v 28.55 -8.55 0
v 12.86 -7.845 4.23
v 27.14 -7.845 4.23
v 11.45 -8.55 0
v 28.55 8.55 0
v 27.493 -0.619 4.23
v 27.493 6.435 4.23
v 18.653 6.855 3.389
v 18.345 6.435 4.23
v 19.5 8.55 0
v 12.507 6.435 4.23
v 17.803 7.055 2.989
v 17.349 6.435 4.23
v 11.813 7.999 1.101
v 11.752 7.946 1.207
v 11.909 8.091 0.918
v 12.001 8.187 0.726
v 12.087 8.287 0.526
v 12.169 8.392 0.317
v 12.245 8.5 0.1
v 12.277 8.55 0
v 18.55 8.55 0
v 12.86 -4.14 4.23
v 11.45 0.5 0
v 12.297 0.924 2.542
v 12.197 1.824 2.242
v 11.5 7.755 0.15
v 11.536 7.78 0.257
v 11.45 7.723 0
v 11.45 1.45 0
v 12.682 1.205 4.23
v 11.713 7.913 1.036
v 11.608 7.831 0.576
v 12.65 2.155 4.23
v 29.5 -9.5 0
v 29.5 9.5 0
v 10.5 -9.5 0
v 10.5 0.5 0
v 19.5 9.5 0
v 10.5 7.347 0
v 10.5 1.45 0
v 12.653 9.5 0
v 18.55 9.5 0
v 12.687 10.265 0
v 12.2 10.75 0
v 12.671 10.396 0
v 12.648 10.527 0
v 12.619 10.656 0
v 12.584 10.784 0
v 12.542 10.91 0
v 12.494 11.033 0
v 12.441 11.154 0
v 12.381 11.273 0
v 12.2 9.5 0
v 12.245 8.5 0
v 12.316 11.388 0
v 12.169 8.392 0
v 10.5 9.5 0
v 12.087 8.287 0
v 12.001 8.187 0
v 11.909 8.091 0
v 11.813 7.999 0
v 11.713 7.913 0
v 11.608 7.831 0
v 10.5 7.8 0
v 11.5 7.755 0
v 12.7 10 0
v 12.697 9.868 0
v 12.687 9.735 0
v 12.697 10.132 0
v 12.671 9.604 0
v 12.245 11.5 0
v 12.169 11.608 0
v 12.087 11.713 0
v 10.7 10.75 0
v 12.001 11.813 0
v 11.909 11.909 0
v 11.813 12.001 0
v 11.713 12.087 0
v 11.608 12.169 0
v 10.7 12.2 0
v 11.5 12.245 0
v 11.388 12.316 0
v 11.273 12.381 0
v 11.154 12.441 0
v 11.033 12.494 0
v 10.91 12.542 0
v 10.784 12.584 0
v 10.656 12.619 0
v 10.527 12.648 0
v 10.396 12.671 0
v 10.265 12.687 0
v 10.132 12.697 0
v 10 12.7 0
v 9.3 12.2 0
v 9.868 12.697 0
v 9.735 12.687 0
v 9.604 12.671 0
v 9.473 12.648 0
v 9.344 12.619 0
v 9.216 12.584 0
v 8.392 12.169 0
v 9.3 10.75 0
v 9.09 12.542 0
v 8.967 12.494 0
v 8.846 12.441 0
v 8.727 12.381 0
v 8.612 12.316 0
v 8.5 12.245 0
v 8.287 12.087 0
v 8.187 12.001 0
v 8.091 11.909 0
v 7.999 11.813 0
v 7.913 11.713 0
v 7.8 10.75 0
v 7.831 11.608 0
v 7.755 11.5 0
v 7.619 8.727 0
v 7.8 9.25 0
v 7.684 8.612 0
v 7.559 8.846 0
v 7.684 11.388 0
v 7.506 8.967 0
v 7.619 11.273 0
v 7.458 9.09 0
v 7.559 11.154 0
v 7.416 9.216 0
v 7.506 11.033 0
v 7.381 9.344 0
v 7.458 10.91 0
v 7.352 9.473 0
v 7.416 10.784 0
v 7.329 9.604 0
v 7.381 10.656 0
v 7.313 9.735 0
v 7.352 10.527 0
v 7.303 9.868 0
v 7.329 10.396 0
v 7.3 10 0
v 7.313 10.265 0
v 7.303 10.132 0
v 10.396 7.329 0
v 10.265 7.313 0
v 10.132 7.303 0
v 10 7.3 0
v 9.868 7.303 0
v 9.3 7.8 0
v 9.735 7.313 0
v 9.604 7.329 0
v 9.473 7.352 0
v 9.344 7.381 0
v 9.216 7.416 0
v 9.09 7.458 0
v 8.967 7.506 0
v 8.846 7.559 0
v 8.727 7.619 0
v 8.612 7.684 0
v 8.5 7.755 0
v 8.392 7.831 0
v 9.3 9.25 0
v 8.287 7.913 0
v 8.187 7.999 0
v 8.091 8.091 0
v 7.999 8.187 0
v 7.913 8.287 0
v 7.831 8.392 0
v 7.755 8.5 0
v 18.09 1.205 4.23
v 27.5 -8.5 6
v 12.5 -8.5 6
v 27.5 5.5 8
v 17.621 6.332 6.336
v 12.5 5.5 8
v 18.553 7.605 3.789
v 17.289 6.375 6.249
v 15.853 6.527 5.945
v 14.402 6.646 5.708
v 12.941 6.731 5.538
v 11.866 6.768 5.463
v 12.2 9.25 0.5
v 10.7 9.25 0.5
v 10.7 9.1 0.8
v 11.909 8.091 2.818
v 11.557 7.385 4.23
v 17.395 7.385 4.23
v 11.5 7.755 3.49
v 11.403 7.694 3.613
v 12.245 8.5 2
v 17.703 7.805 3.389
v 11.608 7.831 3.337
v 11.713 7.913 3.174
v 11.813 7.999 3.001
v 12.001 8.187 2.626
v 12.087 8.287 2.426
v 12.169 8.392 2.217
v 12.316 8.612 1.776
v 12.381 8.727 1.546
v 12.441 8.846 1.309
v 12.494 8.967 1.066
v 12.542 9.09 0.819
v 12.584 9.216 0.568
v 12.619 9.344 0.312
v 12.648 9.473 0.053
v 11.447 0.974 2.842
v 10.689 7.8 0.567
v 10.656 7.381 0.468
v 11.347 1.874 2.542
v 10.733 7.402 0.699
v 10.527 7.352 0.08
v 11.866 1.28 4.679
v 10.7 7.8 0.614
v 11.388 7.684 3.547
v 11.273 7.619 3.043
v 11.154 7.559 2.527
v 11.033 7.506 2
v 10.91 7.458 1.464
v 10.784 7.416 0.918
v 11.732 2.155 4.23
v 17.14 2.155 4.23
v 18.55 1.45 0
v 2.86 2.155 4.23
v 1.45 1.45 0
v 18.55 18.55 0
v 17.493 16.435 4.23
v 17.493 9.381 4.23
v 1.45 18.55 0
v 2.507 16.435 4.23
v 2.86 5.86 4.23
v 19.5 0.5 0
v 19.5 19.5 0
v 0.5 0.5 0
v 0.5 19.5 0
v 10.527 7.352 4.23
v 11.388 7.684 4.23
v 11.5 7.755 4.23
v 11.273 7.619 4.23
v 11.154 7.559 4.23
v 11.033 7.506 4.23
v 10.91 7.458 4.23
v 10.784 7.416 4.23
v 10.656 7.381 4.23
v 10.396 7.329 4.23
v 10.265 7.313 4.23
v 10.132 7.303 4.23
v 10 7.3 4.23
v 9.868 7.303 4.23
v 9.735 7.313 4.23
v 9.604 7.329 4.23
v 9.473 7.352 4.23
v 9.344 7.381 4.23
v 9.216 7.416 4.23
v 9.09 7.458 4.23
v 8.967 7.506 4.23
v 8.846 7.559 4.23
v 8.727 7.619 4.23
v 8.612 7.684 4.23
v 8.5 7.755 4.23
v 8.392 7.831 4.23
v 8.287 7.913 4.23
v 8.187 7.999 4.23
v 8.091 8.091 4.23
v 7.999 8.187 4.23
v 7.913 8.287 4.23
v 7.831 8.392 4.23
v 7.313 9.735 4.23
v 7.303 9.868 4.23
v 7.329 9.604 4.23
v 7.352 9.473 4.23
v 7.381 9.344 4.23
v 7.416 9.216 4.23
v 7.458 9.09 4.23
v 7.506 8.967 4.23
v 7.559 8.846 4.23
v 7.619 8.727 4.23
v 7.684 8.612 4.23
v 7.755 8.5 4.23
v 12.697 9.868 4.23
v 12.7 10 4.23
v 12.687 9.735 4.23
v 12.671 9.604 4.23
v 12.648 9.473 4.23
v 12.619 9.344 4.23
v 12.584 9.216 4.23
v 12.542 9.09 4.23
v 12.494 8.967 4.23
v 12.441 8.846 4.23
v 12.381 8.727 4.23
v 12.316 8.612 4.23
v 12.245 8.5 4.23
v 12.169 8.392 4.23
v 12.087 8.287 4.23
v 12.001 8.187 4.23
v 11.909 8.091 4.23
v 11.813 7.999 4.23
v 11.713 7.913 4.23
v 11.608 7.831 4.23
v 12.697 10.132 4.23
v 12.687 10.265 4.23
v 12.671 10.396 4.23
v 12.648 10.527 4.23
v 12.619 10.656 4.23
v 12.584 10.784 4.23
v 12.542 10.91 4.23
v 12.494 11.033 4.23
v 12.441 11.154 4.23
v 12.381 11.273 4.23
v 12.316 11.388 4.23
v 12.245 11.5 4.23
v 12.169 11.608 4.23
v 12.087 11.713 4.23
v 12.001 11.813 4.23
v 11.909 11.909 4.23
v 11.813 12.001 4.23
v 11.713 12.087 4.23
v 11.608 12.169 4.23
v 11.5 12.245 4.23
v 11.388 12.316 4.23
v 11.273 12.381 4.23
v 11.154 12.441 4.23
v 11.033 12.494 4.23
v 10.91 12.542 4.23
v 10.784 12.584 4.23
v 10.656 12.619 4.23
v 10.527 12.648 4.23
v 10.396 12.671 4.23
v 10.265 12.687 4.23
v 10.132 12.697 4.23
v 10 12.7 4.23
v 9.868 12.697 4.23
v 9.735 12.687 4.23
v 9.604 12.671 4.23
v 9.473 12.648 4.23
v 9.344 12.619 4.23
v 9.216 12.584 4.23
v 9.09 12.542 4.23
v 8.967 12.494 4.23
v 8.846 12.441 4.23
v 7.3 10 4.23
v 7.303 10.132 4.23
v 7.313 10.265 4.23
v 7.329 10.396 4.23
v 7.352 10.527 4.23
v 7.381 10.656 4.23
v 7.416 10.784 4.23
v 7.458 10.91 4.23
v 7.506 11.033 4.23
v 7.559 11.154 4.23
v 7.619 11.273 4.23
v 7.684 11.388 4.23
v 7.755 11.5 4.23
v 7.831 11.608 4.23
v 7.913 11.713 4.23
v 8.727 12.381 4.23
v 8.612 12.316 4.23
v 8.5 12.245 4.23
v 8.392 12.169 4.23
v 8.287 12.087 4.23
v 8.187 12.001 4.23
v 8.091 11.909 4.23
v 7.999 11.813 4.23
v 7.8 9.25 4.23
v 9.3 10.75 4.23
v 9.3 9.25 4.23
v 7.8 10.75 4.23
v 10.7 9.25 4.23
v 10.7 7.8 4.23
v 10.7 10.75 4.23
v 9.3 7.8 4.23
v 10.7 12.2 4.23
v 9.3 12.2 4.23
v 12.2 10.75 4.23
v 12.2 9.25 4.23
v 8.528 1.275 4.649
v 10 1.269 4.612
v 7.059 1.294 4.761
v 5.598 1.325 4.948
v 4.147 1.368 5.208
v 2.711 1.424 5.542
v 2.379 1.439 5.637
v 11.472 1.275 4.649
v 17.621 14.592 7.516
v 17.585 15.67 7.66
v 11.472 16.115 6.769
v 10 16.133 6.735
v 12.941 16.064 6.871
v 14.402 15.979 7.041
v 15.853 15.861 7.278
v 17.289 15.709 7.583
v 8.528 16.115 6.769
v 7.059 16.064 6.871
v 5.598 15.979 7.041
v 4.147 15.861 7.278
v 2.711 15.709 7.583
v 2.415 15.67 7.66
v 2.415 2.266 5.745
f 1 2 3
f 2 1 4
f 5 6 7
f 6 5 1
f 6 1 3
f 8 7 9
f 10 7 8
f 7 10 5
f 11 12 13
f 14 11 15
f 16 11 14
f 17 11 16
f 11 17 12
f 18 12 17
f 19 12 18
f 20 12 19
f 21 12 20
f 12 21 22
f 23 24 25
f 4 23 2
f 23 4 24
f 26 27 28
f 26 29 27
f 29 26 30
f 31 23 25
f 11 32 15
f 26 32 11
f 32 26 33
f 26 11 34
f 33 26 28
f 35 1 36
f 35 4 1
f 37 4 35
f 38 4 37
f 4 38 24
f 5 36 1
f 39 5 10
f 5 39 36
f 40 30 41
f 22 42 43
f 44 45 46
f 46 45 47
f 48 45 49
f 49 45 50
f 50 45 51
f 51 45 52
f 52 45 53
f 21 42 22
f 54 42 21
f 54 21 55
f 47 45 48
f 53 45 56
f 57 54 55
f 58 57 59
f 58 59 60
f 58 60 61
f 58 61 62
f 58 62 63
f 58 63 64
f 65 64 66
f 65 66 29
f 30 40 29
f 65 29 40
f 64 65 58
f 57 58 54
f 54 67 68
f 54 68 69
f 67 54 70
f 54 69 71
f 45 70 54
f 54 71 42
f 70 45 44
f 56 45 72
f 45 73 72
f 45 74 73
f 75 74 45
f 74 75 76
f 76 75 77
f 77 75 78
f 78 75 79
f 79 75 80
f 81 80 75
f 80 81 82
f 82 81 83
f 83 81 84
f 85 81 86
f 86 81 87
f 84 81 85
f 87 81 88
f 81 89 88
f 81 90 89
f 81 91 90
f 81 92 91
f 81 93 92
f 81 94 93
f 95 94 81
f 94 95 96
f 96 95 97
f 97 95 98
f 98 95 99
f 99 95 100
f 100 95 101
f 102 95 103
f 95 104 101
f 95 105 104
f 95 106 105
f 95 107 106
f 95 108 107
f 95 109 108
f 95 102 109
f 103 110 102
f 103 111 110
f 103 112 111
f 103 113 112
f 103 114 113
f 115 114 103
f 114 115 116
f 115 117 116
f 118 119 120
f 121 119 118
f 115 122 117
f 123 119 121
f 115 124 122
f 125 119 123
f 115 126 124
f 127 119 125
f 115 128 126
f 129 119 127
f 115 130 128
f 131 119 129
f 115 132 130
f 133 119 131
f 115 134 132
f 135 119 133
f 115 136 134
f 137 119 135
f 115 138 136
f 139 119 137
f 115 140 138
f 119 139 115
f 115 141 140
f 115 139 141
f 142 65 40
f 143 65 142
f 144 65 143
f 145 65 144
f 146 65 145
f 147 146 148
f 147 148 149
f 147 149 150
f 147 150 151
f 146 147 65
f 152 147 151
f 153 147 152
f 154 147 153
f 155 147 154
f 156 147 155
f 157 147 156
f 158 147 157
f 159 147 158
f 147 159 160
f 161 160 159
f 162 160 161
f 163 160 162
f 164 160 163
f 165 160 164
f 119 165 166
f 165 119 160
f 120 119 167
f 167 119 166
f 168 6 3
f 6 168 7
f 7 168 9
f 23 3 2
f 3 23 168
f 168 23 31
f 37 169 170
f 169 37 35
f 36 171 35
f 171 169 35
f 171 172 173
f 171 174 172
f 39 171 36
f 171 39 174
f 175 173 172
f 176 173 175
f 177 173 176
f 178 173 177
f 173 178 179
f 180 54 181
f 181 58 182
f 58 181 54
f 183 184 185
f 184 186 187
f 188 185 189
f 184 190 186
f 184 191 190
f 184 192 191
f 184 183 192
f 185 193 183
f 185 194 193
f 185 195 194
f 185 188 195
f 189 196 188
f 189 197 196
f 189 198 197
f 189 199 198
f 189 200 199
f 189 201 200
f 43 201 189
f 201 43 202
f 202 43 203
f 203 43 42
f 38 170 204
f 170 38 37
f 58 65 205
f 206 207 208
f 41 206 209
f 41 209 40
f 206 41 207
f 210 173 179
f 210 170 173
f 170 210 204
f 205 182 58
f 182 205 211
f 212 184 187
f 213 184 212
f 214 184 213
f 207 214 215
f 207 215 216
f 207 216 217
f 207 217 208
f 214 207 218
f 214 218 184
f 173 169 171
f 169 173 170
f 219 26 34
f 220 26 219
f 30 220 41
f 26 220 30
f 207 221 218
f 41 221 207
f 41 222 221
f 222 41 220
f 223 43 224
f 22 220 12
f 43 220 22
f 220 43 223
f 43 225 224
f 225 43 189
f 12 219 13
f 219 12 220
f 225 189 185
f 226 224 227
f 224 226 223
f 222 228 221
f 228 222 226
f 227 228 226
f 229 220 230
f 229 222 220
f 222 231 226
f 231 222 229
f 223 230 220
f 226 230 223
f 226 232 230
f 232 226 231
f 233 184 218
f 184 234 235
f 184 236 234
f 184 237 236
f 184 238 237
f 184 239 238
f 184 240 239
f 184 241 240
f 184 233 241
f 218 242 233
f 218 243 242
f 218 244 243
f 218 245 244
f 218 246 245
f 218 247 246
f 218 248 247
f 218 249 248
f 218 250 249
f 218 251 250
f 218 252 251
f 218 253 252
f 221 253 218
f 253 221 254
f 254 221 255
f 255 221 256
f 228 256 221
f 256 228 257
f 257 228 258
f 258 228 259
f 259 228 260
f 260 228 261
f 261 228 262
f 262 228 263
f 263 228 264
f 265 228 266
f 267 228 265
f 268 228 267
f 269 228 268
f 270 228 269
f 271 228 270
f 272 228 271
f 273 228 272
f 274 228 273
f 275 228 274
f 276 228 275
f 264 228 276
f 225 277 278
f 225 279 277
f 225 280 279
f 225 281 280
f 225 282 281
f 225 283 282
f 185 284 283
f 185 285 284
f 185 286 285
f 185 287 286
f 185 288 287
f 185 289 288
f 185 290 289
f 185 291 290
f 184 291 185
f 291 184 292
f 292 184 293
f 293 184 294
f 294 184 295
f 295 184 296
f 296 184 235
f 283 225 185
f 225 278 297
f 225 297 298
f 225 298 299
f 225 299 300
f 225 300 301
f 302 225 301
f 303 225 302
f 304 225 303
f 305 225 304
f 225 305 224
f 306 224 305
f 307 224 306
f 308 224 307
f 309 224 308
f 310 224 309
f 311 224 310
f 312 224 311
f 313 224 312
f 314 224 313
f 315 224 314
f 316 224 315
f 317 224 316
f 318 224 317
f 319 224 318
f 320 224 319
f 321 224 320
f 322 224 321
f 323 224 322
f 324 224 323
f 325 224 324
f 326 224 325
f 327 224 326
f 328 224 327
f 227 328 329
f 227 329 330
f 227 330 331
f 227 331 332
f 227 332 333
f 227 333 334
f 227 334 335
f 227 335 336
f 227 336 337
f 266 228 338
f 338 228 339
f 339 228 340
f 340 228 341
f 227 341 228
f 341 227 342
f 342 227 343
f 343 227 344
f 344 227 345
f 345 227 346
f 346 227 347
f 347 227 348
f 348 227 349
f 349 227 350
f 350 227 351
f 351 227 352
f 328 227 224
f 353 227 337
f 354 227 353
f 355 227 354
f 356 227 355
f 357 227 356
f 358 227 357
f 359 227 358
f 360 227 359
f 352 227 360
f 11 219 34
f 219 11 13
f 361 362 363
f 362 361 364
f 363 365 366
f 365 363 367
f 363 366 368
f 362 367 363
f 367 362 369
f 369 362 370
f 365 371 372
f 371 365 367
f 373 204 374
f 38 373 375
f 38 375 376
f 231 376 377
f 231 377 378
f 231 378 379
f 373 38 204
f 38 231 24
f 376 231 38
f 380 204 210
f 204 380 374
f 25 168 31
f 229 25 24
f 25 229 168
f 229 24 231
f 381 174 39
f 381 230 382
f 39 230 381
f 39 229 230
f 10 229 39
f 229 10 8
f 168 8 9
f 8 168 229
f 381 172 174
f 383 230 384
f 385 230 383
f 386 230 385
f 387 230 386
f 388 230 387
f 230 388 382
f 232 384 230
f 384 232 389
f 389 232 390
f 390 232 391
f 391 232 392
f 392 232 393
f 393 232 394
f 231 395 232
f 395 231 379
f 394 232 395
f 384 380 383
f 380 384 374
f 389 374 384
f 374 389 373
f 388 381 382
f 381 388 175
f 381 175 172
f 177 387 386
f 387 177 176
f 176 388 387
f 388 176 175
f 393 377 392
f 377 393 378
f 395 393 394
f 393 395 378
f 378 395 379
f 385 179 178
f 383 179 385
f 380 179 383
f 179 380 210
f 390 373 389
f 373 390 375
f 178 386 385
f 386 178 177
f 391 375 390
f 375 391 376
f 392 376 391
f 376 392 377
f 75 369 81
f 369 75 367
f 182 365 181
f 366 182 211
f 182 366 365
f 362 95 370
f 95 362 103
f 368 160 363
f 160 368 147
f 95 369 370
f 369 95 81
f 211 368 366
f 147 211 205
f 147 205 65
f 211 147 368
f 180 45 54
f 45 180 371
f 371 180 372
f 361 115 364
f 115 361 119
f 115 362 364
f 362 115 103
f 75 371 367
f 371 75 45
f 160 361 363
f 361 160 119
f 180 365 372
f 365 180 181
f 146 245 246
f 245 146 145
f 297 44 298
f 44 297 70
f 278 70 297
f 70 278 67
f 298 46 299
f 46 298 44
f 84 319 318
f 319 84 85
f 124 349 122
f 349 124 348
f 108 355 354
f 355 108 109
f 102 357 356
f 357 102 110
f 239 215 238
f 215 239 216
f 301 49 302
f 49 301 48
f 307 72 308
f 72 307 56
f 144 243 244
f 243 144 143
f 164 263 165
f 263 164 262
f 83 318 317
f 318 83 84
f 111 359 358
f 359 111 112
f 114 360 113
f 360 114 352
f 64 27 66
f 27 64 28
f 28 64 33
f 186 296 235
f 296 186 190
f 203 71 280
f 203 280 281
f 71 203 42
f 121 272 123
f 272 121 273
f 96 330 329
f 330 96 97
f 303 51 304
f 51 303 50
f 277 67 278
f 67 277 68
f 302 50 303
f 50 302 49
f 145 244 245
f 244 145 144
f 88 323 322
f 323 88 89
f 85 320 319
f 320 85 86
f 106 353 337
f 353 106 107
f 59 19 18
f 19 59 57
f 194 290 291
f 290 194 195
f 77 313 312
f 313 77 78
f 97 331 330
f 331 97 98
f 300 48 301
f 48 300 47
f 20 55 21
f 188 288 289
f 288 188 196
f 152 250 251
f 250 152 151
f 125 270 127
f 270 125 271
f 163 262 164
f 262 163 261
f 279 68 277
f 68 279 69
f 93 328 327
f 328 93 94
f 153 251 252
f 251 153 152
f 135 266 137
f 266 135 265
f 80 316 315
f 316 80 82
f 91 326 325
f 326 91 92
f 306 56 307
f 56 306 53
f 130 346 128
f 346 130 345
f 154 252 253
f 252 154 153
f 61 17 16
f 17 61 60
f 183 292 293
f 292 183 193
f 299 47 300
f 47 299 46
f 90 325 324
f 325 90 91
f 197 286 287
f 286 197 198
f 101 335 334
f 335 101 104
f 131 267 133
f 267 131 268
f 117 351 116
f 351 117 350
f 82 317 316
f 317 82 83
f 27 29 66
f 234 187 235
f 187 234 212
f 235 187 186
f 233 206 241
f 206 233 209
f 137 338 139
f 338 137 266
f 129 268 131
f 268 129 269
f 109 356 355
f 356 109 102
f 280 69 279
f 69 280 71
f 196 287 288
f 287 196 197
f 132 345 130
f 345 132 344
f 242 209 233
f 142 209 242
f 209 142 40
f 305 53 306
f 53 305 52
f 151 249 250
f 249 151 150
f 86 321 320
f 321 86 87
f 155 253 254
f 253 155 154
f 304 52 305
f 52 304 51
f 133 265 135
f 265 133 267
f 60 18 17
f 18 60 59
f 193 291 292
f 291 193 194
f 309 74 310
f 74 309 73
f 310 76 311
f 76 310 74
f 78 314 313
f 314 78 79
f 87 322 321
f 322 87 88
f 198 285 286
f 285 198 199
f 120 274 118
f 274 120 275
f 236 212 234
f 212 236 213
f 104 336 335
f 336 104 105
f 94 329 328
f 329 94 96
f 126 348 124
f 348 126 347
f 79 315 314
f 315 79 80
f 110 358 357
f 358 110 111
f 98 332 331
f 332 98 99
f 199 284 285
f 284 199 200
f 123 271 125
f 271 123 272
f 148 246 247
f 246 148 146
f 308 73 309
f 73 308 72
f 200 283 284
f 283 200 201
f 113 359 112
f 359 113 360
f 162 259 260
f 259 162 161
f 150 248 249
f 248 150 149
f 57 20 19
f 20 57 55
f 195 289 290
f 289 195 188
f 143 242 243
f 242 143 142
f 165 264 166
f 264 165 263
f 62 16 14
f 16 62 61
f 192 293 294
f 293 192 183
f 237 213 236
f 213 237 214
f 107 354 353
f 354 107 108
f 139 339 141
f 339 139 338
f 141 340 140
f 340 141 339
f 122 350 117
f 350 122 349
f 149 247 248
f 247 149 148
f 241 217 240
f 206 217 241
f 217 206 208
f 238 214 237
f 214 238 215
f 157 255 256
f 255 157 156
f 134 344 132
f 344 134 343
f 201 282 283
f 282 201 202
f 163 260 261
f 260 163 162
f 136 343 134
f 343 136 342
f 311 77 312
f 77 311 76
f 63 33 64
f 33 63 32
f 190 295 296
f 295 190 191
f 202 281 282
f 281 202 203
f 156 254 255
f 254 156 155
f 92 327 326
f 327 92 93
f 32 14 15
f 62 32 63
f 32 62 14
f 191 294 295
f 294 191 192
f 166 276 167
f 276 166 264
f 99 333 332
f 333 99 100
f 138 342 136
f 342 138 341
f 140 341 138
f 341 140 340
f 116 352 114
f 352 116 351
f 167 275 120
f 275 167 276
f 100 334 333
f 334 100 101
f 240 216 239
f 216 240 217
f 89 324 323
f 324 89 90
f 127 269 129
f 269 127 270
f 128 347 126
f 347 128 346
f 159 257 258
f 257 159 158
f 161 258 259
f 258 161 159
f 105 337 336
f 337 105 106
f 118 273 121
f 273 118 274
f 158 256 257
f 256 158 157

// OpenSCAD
/*
	skull:
		stem 
			starts 0.8mm into cap bottom
			hole height = 60
			cyl height  = 44
			
			5.6 d
			
*/



// Row 4 decorated Cherry MX key

// dimensions Cherry MX connector
c_corr = .4;                // tolerance
c_horiz = 1.1;              // horizontal bar width
c_vert = 1.0;               // vertical bar width
c_dia = 4;                  // cross width
c_depth = 6;                // connector depth
c_space = 4;                // height of hollow inside
c_inset = .75;              // distance connector start to keycap base

// stuff
$fn = 64;

// construct the connector pin
module connector() 
{
	difference() {
		cylinder( h=c_space+c_corr, r=(c_dia+1+c_corr)/2 );
	    translate([0,0,c_depth/2]) union()
	    {
	        cube([c_vert+c_corr,c_dia+c_corr,c_depth+.1], center=true );
	        cube([c_dia+c_corr,c_horiz+c_corr,c_depth+.1], center=true );
	    }
	}

	//c_plate_w = ( base_w - 2*(dx*(z_front-c_depth)));
	//scale([0.9,0.9,1]) translate([0,0,c_depth-1]) cube([c_plate_w,c_plate_w,1], center=true);
}


// These seem fixed
base_w = 19;
top_y = 14;
dx = 2; 	// top sides are pushed to center
dy = 1;  // top is pushed back this far 

z_front = 4+2; // height at front edge
z_back  = 4+2+2;  // height at back edge

angle = atan((z_front-z_back)/top_y);
//echo ( "Angle=", angle);


/*
		   ______
		  /8   7/|
		 /5___6/	 |
		| |___|_ | 
		| /4  | 3/
	    |/1___2|/ 

		 
*/

module hull ()
{
	translate([-base_w/2, -base_w/2, 0]) {
	
	render() polyhedron (
		points = [
			[ 0, 0, 0 ], 
			[ 0		,0 		,0 ],
			[ base_w	,0 		,0 ],
			[ base_w	,base_w	,0 ],
			[ 0		,base_w	,0 ],
			[ dx			,dy 			,z_front ],
			[ base_w	-dx 	,dy 			,z_front ],
			[ base_w	-dx 	,dy+top_y	,z_back ],
			[ dx			,dy+top_y	,z_back ],
		], 
		triangles = [
			[1,2,6], [1,6,5], 
			[2,3,7], [2,7,6], 
			[3,4,8], [3,8,7], 
			[4,1,5], [4,5,8], 
			[5,6,7], [5,7,8], 
			[1,4,2], [2,4,3]
		]
	);
}
}

module stem() 
{
	difference(){
		cylinder(h=20, r=3);
		union()
		{
		}
	}
}


module cap ()
{
	difference()	 {
		hull();
		scale(0.9) {
			//translate ([0,0,0.21]) cube([base_w, base_w, 2]);
			difference(){
				hull();
				translate([0,0,c_depth-1.3+20/2]) cube([base_w,base_w,20], center=true);
			}
		}
	}
}


module cap_cyl()
{
$fn = 128;
r_cyl = 30;

translate( [10,10,0]){
rotate ([-angle,0,0]) 	difference()  {
      	rotate ([angle,0,0]) cap();
		rotate ([90,0,0]) translate([0,z_back+r_cyl-1.0 -1.2,-base_w/2]) cylinder(h=base_w, r=r_cyl);
	}
	connector();
	
}
}

translate([20,0,0]) cap();

cap_cyl();
